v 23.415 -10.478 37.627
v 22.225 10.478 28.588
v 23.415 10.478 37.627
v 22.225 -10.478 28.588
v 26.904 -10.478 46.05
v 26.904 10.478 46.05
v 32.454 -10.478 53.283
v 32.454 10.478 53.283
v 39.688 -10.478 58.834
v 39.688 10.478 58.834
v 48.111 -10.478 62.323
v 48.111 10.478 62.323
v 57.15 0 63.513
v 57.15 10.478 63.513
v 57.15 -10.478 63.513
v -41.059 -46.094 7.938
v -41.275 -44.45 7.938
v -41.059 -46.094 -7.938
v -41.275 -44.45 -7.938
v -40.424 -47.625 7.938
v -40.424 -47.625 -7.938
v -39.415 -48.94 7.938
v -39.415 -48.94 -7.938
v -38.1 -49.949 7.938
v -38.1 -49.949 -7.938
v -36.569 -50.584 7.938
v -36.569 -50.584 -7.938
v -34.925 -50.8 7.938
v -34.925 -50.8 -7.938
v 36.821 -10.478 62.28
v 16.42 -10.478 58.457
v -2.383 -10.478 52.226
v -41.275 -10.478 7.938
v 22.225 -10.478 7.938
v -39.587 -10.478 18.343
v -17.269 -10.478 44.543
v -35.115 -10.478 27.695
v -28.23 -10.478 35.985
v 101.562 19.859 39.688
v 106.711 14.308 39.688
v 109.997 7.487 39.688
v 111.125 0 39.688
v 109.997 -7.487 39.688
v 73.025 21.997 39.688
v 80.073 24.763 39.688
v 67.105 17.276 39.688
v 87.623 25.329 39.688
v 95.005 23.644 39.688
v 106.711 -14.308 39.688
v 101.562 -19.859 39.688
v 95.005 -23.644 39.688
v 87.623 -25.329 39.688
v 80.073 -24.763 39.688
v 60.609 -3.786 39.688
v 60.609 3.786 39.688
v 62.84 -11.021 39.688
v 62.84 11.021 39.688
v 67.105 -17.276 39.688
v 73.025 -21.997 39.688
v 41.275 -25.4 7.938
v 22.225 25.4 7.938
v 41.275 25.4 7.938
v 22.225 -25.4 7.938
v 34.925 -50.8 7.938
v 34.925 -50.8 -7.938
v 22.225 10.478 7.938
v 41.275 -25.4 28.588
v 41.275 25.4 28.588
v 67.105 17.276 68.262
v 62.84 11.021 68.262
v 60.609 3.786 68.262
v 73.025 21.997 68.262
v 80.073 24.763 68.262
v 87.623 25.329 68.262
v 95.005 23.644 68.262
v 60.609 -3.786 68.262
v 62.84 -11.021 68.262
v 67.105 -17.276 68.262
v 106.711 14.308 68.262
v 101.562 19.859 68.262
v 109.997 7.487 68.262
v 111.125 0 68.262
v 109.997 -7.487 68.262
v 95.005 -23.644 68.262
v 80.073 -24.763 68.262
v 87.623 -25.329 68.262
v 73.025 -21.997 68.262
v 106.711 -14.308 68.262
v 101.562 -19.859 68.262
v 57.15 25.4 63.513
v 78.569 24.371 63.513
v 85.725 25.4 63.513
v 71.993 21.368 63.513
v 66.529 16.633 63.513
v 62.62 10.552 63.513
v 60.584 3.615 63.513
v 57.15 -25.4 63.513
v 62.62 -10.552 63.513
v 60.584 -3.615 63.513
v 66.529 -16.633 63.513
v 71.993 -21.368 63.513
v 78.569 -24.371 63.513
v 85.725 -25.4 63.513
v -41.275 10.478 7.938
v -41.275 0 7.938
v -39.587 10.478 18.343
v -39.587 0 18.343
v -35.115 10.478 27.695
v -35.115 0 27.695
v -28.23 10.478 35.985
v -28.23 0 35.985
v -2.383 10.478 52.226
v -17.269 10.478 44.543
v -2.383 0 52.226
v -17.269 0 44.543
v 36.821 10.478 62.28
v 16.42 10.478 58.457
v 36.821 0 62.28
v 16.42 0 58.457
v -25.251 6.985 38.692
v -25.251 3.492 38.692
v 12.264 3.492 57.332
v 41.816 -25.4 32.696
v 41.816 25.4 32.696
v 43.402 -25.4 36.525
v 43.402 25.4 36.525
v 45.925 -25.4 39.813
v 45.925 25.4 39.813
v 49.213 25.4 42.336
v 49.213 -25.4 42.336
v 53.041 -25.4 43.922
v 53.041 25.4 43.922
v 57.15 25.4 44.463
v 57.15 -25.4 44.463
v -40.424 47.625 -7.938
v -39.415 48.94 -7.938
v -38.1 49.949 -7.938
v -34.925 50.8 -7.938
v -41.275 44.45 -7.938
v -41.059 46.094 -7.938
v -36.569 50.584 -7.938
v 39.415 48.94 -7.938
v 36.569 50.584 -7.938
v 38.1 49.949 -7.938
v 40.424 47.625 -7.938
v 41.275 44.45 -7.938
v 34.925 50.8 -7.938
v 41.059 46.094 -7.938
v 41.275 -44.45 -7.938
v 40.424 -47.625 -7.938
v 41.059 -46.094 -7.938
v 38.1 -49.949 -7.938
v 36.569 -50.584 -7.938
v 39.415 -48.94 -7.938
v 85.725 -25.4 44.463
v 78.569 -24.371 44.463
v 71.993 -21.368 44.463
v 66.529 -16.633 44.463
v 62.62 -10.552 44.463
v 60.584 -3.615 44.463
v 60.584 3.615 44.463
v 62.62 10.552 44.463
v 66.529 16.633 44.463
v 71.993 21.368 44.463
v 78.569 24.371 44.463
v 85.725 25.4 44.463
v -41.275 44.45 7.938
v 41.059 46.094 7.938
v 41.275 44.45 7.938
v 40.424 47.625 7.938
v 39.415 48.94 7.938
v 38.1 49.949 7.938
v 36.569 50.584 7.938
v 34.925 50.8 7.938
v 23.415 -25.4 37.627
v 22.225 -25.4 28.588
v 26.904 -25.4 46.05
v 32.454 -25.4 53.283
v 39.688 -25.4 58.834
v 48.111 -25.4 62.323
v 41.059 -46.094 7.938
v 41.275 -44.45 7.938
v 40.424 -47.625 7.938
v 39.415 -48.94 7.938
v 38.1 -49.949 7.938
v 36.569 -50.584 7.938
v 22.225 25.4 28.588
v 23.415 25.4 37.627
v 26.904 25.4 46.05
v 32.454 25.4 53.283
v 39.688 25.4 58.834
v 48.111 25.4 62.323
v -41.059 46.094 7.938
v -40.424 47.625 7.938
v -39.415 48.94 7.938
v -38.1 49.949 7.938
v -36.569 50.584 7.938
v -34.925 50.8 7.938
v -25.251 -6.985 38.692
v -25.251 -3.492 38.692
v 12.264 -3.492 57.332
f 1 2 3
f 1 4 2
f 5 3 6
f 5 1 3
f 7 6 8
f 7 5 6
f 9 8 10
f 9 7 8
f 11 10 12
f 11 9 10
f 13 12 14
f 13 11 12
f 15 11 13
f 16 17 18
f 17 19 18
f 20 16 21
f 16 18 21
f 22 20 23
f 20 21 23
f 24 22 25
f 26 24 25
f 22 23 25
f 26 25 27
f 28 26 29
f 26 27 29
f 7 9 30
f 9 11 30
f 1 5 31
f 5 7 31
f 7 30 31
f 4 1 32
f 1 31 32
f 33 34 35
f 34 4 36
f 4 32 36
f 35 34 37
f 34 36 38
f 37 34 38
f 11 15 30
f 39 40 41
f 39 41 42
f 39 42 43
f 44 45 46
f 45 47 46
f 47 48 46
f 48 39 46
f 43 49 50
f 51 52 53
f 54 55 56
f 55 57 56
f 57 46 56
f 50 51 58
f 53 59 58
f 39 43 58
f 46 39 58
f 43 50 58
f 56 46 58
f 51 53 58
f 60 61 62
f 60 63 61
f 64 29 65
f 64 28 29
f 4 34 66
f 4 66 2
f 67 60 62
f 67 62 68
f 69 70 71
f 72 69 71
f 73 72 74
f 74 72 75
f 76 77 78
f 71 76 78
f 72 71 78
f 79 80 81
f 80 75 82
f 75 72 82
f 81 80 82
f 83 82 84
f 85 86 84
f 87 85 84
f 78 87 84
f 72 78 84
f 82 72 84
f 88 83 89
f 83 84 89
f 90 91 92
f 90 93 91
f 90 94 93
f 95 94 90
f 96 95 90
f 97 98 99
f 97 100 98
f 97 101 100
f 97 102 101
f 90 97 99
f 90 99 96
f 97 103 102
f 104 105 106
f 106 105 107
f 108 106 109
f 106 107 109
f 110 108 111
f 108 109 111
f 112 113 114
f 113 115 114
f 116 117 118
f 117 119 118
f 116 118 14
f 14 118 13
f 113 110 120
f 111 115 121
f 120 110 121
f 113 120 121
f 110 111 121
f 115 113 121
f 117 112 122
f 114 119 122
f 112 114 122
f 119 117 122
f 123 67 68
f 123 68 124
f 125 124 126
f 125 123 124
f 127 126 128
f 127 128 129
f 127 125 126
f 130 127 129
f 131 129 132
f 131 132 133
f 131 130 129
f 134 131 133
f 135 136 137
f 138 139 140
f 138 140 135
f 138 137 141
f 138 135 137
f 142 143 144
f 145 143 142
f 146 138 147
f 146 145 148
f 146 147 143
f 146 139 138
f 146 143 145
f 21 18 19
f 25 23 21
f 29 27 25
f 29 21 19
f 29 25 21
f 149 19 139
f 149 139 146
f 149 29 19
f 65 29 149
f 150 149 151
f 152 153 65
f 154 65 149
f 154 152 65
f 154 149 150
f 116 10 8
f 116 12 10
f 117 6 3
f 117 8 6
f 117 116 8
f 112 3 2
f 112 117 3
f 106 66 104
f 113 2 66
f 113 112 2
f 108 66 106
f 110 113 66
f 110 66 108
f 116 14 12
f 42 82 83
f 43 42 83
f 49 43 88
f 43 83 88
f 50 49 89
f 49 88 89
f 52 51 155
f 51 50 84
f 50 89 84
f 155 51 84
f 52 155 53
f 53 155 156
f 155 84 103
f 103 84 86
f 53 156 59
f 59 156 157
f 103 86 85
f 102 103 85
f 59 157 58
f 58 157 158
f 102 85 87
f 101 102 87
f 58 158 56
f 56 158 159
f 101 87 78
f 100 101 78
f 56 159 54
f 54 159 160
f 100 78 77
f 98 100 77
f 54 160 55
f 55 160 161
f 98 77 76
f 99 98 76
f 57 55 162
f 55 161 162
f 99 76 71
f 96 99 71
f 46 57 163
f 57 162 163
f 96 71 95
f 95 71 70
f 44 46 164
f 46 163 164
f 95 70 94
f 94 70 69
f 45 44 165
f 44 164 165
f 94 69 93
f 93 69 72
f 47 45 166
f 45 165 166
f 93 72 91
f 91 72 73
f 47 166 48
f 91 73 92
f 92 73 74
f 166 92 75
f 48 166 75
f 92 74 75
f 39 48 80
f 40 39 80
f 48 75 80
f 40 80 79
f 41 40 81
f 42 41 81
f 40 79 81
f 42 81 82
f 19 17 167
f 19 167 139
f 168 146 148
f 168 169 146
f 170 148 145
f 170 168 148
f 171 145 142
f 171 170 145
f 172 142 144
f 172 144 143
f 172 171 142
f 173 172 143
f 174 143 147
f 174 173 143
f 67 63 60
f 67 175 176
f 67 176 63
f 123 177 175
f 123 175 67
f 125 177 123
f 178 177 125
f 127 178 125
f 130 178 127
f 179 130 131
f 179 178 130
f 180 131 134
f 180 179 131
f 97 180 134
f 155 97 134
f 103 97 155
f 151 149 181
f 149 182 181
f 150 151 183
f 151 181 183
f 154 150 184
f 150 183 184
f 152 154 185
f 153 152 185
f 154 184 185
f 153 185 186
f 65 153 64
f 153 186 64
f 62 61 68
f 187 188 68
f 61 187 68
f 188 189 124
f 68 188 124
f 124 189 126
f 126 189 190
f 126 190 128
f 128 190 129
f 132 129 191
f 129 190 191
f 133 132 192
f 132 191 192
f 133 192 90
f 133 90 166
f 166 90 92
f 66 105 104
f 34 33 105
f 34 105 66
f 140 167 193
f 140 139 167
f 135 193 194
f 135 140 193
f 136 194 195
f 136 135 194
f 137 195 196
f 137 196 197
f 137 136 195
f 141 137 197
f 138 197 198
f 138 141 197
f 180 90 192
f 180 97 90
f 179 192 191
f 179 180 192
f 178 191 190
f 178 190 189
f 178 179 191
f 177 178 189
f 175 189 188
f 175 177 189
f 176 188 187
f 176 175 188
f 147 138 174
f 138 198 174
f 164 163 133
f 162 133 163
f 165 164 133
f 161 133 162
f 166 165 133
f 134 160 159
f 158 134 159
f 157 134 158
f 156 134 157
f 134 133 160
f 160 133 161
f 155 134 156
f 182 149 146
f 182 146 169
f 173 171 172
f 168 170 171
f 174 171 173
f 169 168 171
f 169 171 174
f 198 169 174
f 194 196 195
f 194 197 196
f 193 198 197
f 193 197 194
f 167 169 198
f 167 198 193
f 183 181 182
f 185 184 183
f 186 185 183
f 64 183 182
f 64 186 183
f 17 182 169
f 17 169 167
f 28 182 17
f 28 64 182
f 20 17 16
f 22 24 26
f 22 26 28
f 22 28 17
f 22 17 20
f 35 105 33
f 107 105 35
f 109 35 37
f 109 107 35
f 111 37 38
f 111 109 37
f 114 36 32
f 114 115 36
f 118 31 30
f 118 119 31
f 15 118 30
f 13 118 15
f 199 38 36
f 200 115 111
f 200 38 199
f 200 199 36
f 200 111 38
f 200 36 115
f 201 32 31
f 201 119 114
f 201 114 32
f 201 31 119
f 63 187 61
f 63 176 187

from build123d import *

# Parameters (mm, degrees)
F1_DEPTH      = 50.8
F1_DEPTH_BACK = 50.8
F0_W          = 25.4
F0_H          = 19.05
F2_DEPTH      = 25.4
F3_DEPTH      = 10.4775
F5_R          = 6.35


with BuildPart() as f1:
    # F0 (on Front) → F1 (new body, two sides)
    with BuildSketch(Plane.XZ) as f1_sk:
        Polygon((-41.275, 7.9375), (-41.275, -7.9375), (41.275, -7.9375), (41.275, 7.9375), (22.225, 7.9375), align=None)
    extrude(amount=F1_DEPTH)
    extrude(f1_sk.sketch, amount=-F1_DEPTH_BACK)

    # F5
    f5_edges = [f1.edges().sort_by_distance(p)[0] for p in [
        (41.275, -50.8, 0),
        (-41.275, -50.8, 0),
        (-41.275, 50.8, 0),
        (41.275, 50.8, 0),
    ]]
    fillet(f5_edges, radius=F5_R)


with BuildPart() as f2:
    # F0 (on Front) → F2 (new body, symmetric)
    with BuildSketch(Plane.XZ):
        with BuildLine():
            Line((22.225, 7.9375), (41.275, 7.9375))
            Line((41.275, 7.9375), (41.275, 28.5877))
            ThreePointArc((41.275, 28.5877), (45.92468, 39.81302), (57.15, 44.4627))
            Line((57.15, 44.4627), (60.325, 44.4627))
            Line((60.325, 44.4627), (60.325, 63.5127))
            Line((60.325, 63.5127), (57.15, 63.5127))
            ThreePointArc((57.15, 63.5127), (32.454296, 53.283404), (22.225, 28.5877))
            Line((22.225, 28.5877), (22.225, 7.9375))
        make_face()
        with Locations((73.025, 53.9877)):
            Rectangle(F0_W, F0_H)
    extrude(amount=F2_DEPTH, both=True)

    # F0 (on Front) → F4 (revolve)
    with BuildSketch(Plane.XZ):
        Polygon((85.725, 68.2625), (85.725, 63.5127), (85.725, 44.4627), (85.725, 39.6875), (111.125, 39.6875), (111.125, 68.2625), align=None)
    revolve(axis=Axis((85.725, 0, 53.975), (0, 0, -1)))


with BuildPart() as f3:
    # F0 (on Front) → F3 (new body, symmetric)
    with BuildSketch(Plane.XZ):
        with BuildLine():
            add(Edge.make_bspline(
                [(-41.275, 7.9375), (-40.702146, 44.634301), (13.28382, 63.67591), (57.15, 63.5127)],
                knots=[0, 0, 0, 0, 113.031338, 113.031338, 113.031338, 113.031338], degree=3))
            Line((-41.275, 7.9375), (22.225, 7.9375))
            Line((22.225, 7.9375), (22.225, 28.5877))
            ThreePointArc((22.225, 28.5877), (32.454296, 53.283404), (57.15, 63.5127))
        make_face()
    extrude(amount=F3_DEPTH, both=True)


solid = Compound([f1.part, f2.part, f3.part])
